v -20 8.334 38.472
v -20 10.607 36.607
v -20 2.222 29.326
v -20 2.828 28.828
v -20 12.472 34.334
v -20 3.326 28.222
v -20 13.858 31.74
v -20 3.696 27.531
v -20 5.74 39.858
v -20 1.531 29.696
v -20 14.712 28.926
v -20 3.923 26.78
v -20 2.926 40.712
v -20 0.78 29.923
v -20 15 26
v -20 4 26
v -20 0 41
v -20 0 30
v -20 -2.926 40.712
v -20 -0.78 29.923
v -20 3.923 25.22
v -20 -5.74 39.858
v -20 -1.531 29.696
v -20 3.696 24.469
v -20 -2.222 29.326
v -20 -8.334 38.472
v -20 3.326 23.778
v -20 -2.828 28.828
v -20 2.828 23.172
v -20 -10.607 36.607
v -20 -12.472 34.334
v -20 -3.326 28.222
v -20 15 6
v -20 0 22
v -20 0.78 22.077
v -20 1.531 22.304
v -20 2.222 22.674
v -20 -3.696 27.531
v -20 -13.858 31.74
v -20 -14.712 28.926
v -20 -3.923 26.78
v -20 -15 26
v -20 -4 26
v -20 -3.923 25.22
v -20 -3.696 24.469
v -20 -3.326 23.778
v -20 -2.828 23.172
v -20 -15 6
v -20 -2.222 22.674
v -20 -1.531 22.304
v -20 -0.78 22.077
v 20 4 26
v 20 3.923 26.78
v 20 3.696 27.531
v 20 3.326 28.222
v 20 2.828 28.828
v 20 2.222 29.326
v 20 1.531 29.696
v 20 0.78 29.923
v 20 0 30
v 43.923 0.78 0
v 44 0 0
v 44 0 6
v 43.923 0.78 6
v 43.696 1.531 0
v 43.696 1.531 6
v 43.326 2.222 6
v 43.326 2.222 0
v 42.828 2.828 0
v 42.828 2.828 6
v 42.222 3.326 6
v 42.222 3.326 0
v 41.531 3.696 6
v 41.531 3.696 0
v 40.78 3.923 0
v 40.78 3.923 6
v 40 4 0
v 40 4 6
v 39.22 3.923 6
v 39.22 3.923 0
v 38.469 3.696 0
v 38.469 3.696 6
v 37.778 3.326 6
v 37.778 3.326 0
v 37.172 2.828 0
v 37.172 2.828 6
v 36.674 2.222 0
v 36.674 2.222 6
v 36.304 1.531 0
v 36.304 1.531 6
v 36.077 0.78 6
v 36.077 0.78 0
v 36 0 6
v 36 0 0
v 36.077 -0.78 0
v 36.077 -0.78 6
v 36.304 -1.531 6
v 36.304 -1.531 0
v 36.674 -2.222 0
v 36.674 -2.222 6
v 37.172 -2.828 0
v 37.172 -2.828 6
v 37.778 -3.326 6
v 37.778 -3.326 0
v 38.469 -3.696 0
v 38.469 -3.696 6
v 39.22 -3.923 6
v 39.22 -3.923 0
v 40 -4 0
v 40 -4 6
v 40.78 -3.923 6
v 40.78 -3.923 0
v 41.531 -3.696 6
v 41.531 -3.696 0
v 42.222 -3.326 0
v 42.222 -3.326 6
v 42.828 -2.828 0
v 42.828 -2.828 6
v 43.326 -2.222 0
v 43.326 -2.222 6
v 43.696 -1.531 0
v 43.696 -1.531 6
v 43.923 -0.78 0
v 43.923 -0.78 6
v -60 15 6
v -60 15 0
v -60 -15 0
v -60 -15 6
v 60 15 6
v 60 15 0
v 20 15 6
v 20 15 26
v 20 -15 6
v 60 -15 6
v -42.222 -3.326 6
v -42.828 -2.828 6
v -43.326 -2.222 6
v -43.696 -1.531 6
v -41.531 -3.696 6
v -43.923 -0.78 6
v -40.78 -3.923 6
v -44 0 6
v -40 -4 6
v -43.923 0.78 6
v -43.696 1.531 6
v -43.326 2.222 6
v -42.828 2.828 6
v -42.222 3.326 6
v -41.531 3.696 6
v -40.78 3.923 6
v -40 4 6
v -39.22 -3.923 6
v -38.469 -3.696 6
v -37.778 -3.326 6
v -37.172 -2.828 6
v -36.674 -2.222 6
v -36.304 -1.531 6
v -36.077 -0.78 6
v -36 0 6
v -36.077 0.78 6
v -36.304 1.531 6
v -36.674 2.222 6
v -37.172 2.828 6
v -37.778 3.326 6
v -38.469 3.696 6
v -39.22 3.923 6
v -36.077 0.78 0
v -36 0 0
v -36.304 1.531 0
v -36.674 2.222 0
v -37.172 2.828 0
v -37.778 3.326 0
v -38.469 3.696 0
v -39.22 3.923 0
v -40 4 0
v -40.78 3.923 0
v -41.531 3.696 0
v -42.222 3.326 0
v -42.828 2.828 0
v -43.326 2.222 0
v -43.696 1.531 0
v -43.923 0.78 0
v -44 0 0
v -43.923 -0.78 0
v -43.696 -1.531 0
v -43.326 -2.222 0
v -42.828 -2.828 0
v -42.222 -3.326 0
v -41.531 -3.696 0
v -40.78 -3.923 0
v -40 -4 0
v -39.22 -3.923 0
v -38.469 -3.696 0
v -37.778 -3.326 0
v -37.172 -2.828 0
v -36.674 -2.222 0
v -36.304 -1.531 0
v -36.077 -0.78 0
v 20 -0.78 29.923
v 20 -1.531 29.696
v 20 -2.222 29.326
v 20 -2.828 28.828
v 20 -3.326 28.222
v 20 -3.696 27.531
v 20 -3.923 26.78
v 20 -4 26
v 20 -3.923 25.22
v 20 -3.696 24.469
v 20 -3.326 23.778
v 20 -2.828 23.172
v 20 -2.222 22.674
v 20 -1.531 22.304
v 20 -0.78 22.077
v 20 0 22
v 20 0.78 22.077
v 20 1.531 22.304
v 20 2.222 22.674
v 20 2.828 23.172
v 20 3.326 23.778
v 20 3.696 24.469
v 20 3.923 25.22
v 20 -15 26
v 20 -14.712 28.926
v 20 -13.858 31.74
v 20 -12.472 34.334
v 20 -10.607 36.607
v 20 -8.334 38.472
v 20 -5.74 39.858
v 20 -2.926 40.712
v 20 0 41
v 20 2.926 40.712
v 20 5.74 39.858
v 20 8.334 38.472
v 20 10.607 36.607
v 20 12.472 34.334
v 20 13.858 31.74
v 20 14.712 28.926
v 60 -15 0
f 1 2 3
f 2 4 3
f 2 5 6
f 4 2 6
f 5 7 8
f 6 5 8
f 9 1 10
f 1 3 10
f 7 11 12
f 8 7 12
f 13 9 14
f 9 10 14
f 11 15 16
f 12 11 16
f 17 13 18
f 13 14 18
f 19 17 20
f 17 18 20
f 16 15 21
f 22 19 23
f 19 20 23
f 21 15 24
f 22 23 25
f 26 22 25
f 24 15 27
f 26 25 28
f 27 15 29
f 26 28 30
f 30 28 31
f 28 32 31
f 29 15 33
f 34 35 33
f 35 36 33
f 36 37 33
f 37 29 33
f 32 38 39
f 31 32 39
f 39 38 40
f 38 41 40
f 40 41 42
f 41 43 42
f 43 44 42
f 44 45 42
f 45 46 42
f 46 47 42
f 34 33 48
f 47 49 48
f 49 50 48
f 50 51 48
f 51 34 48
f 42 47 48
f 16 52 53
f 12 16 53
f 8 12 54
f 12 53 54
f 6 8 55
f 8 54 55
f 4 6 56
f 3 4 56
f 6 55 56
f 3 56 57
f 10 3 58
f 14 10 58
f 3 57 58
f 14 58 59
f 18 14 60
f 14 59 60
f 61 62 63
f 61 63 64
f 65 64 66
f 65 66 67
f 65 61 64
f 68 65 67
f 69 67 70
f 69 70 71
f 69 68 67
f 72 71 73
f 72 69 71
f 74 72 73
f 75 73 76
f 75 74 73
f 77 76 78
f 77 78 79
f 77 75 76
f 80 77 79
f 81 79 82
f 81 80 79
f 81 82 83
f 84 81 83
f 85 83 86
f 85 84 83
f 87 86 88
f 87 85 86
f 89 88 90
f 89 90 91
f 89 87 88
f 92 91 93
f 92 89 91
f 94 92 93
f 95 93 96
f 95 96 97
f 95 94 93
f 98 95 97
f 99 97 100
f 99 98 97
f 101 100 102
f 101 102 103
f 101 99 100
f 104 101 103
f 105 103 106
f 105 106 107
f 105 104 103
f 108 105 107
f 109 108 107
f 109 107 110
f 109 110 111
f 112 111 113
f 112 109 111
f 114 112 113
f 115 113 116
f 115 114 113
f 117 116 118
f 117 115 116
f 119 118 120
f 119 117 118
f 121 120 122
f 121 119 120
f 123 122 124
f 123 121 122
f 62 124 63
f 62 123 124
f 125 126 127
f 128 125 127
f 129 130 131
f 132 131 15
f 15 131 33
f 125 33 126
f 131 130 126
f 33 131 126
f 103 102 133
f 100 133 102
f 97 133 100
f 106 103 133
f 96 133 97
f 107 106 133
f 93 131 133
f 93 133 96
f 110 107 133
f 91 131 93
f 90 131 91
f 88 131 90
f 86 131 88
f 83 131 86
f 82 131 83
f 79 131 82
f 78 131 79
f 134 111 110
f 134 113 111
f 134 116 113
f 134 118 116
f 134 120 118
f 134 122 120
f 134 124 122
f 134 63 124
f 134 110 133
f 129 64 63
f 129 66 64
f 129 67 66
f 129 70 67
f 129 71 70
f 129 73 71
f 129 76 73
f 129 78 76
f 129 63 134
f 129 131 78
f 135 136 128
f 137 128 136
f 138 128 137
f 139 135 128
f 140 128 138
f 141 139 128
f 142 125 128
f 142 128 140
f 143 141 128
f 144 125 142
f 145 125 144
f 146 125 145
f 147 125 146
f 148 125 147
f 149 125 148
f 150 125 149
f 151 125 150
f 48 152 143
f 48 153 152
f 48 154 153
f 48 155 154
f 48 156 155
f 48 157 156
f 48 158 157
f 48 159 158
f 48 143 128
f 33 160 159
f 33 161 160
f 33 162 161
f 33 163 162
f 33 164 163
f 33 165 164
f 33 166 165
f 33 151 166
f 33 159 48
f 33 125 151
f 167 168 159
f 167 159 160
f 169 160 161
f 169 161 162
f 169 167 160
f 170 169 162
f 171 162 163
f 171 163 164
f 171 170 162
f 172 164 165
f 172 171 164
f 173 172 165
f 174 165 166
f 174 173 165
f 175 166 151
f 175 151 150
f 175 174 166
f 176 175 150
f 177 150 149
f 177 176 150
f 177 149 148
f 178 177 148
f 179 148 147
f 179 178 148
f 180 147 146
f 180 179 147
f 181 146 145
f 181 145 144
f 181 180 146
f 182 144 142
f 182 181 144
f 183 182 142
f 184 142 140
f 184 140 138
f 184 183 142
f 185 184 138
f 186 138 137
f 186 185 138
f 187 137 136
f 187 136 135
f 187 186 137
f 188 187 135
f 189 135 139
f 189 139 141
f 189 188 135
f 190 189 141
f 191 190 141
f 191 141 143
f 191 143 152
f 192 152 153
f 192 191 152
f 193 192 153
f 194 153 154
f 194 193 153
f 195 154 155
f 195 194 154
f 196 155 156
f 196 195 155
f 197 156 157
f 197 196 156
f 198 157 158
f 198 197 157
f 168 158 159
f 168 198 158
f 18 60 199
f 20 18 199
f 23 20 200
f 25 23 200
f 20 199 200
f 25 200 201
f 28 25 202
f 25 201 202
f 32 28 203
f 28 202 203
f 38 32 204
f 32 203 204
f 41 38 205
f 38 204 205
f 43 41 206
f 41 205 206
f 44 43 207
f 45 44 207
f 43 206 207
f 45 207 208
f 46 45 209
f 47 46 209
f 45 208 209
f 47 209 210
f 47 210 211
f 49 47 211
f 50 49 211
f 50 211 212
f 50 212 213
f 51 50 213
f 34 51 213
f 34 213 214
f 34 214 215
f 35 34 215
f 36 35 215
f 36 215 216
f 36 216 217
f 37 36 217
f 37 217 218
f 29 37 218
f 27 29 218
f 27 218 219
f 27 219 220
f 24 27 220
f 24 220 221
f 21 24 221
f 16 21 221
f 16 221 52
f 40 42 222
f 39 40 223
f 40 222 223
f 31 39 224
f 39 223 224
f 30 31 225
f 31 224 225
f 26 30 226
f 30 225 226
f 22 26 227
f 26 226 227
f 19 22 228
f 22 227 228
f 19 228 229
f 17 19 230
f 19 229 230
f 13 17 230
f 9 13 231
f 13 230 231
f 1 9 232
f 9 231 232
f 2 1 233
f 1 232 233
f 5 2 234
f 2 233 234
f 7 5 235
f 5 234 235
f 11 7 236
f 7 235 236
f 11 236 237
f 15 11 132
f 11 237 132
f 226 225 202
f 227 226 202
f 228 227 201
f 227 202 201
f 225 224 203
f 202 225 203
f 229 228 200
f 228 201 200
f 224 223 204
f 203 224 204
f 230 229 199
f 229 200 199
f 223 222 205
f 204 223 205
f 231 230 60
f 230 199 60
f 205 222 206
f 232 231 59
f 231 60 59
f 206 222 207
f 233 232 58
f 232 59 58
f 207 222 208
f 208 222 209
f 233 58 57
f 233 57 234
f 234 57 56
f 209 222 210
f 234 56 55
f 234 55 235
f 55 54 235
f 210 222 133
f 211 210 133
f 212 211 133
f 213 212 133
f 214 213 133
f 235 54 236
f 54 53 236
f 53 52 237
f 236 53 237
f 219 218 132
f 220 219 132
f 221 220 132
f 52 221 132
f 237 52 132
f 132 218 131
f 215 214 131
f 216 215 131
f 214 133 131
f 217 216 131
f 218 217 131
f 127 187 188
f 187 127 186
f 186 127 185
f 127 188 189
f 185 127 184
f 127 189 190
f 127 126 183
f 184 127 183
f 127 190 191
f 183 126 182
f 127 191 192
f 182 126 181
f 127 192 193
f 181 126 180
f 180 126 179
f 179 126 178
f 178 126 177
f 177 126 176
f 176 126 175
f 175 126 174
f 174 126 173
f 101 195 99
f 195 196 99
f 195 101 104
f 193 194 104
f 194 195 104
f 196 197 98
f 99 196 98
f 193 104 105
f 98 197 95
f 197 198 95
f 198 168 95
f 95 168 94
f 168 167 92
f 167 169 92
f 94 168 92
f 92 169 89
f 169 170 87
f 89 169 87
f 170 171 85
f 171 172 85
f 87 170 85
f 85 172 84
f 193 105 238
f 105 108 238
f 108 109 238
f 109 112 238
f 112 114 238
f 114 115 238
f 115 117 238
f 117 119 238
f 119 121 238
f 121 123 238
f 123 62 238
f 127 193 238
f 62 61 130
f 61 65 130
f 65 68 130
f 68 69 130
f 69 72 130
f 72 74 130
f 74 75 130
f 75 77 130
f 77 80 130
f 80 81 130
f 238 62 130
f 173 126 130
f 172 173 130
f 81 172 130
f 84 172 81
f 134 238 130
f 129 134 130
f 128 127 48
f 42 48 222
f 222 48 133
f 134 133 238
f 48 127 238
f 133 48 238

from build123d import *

# Parameters (mm, degrees)
F0_R     = 4
F1_DEPTH = 6
F3_DEPTH = 35
F5_DEPTH = 45


with BuildPart() as f1:
    # F0 (on Top) → F1 (new body)
    with BuildSketch(Plane.XY):
        Polygon((20, -15), (60, -15), (60, 15), (0, 15), (-20, 15), (-60, 15), (-60, -15), (0, -15), align=None)
        with Locations((-40, 0)):
            Circle(F0_R, mode=Mode.SUBTRACT)
        with Locations((40, 0)):
            Circle(F0_R, mode=Mode.SUBTRACT)
    extrude(amount=F1_DEPTH)

    # F2 (on face) → F3 (join)
    with BuildSketch(Plane.XY.offset(6)):
        Polygon((20, 15), (0, 15), (-20, 15), (-20, -15), (20, -15), align=None)
    extrude(amount=F3_DEPTH)

    # F4 (on face) → F5 (cut)
    with BuildSketch(Plane.YZ.offset(20)):
        with BuildLine():
            Line((15, 41), (0, 41))
            ThreePointArc((0, 41), (10.606602, 36.606602), (15, 26))
            Line((15, 26), (15, 41))
        make_face()
        with BuildLine():
            ThreePointArc((-15, 26), (-10.606602, 36.606602), (0, 41))
            Line((0, 41), (-15, 41))
            Line((-15, 41), (-15, 26))
        make_face()
        with BuildLine():
            ThreePointArc((4, 26), (2.828427, 28.828427), (0, 30))
            ThreePointArc((0, 30), (-2.828427, 23.171573), (4, 26))
        make_face()
    extrude(amount=-F5_DEPTH, mode=Mode.SUBTRACT)


solid = f1.part
